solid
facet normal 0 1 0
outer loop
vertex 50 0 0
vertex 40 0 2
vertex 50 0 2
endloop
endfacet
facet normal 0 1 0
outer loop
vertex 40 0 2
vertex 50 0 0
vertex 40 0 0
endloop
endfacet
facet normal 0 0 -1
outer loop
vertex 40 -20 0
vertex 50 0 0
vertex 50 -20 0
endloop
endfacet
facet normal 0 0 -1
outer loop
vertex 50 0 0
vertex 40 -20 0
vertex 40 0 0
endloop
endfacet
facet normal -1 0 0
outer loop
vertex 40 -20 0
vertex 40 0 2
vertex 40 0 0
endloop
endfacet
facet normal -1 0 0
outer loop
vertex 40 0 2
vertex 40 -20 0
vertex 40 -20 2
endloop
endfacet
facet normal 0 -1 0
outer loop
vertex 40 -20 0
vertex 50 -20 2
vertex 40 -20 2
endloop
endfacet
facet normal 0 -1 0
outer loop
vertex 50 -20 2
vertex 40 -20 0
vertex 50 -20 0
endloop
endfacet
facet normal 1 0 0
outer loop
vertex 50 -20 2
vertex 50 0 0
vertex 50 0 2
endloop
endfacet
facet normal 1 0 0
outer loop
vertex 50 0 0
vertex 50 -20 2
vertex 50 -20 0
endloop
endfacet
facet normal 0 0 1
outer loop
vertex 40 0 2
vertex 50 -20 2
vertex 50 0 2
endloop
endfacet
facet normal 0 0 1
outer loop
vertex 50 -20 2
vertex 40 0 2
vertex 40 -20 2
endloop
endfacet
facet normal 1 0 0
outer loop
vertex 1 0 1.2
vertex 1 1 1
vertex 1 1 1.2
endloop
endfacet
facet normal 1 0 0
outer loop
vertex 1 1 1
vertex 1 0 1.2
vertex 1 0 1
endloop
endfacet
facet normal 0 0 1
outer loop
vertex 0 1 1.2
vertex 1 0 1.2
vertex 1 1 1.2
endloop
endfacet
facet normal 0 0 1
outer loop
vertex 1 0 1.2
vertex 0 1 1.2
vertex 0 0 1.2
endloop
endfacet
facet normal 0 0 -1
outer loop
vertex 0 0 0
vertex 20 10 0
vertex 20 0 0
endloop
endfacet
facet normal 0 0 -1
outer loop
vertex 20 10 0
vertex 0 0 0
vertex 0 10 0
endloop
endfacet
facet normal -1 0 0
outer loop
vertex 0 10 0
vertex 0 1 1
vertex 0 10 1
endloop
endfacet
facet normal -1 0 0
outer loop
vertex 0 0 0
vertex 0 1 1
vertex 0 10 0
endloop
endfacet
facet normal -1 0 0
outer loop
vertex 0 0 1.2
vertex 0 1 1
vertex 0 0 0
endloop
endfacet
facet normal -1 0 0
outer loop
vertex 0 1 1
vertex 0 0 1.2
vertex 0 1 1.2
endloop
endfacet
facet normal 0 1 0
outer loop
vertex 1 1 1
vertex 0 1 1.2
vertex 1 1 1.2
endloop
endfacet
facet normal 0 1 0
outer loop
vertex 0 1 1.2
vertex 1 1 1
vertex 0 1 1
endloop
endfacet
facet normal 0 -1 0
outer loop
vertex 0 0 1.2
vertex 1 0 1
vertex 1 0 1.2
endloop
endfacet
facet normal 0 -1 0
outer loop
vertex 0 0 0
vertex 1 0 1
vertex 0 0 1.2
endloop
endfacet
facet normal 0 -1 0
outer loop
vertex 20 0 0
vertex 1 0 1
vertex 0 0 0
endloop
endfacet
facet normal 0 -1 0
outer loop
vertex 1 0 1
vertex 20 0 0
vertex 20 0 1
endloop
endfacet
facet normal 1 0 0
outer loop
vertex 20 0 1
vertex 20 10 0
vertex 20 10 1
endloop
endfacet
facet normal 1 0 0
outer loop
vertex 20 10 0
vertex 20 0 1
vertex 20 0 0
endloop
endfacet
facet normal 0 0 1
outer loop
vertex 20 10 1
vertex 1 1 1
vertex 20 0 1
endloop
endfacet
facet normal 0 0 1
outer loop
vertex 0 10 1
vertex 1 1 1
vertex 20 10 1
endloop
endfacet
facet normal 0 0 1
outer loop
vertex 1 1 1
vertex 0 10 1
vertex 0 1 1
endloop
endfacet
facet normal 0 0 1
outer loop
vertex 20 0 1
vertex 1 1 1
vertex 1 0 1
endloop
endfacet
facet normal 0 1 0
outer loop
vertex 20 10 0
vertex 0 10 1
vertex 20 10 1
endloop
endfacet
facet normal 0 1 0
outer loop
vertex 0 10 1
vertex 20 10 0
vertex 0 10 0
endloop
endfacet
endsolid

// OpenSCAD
x = $t * 40;
y = $t * 40;
x1 = $t * 60;

//recommended FPS: 30, steps: 100

pole = 4;
test_rotate = 0;

module rotate_about_pt(a, v, pt){
    translate(pt)
        rotate(a, v)
            translate(-pt)
                children();
} 
//system of coordinats by object
if(test_rotate){
    translate([50,0,0])
    rotate_about_pt(-$t*360, [0,0,1], [0,10,0]) 
    union(){
        translate([0,9,0])
        color("Red") cube([1,1,1.2]);
        cube([20,10,1]);
    }
}
//rotate_about_pt($t*360, [0,0,1], [0,0,0])

translate([20,-10,0]) rotate_about_pt(90, [0,0,1], [20,10,0])
color([0.3, 0.3, 0, 0.1]) union(){
    translate([19,9,0])
    color("Red") cube([1,1,1.2]);
    translate([0,9,0])
    color("Red") cube([1,1,1.2]);
    translate([0,0,0])
    color("Red") cube([1,1,1.2]);
    translate([19,0,0])
    color("Red") cube([1,1,1.2]);
    cube([20,10,2]);
}

//first pole
if(pole == 1){
    if(x <= 20){
        translate([x, 0, 0])
        union(){
            translate([19,9,0])
            color("Red") cube([1,1,1.2]);
            cube([20,10,1]);
        }
    }
    else if(x >= 20){
        if((-y + 20) >= -10){
            translate([20,-y + 20,0])
            union(){
                translate([19,9,0])
                color("Red") cube([1,1,1.2]);
                cube([20,10,1]);
            }
        }
        else{
            translate([20,-10,0])
            rotate_about_pt(($t - 0.75)*360, [0,0,1], [20,10,0])
            union(){
                translate([19,9,0])
                color("Red") cube([1,1,1.2]);
                cube([20,10,1]);
            }
        }    
    } 
}

// second pole
if(pole == 2){
    if(x <= 30){
        translate([x, 0, 0])
        union(){
            translate([19,0,0])
            color("Red") cube([1,1,1.2]);
            cube([20,10,1]);
        }   
    }
    else if(x >= 30){
        translate([30,0,0])
        rotate_about_pt(($t - 0.75)*360, [0,0,1], [20,0,0])
        union(){
            translate([19,0,0])
            color("Red") cube([1,1,1.2]);
            cube([20,10,1]);
        }
    }    
}
//third pole
if(pole == 3){
     if(x1 <= 25){
        translate([2*x1, 0, 0])
        union(){
            translate([0,9,0])
            color("Red") cube([1,1,1.2]);
            cube([20,10,1]);
        }   
    }
    else if(x1 >= 25 && x1 <= 40){
        translate([50,0,0])
        rotate_about_pt(-($t - 0.42)*360, [0,0,1], [0,10,0])
        union(){
            translate([0,9,0])
            color("Red") cube([1,1,1.2]);
            cube([20,10,1]);
        }
    } 
    else if(x1 >= 40 && x1 <= 50){
        translate([50,-x1 + 40,0])
        rotate_about_pt(-90, [0,0,1], [0,10,0])
        union(){
            translate([0,9,0])
            color("Red") cube([1,1,1.2]);
            cube([20,10,1]);
        }
    }    
}
//fourth pole
if(pole == 4){
    if(x <= 20){
        translate([2*x, 0, 0])
        union(){
            translate([0,0,0])
            color("Red") cube([1,1,1.2]);
            cube([20,10,1]);
        } 
    } 
    else{
        translate([40,0,0])
        rotate_about_pt(-($t - 0.5)*180, [0,0,1], [0,0,0])
        union(){
            translate([0,0,0])
            color("Red") cube([1,1,1.2]);
            cube([20,10,1]);
        }  
    }    
}    
